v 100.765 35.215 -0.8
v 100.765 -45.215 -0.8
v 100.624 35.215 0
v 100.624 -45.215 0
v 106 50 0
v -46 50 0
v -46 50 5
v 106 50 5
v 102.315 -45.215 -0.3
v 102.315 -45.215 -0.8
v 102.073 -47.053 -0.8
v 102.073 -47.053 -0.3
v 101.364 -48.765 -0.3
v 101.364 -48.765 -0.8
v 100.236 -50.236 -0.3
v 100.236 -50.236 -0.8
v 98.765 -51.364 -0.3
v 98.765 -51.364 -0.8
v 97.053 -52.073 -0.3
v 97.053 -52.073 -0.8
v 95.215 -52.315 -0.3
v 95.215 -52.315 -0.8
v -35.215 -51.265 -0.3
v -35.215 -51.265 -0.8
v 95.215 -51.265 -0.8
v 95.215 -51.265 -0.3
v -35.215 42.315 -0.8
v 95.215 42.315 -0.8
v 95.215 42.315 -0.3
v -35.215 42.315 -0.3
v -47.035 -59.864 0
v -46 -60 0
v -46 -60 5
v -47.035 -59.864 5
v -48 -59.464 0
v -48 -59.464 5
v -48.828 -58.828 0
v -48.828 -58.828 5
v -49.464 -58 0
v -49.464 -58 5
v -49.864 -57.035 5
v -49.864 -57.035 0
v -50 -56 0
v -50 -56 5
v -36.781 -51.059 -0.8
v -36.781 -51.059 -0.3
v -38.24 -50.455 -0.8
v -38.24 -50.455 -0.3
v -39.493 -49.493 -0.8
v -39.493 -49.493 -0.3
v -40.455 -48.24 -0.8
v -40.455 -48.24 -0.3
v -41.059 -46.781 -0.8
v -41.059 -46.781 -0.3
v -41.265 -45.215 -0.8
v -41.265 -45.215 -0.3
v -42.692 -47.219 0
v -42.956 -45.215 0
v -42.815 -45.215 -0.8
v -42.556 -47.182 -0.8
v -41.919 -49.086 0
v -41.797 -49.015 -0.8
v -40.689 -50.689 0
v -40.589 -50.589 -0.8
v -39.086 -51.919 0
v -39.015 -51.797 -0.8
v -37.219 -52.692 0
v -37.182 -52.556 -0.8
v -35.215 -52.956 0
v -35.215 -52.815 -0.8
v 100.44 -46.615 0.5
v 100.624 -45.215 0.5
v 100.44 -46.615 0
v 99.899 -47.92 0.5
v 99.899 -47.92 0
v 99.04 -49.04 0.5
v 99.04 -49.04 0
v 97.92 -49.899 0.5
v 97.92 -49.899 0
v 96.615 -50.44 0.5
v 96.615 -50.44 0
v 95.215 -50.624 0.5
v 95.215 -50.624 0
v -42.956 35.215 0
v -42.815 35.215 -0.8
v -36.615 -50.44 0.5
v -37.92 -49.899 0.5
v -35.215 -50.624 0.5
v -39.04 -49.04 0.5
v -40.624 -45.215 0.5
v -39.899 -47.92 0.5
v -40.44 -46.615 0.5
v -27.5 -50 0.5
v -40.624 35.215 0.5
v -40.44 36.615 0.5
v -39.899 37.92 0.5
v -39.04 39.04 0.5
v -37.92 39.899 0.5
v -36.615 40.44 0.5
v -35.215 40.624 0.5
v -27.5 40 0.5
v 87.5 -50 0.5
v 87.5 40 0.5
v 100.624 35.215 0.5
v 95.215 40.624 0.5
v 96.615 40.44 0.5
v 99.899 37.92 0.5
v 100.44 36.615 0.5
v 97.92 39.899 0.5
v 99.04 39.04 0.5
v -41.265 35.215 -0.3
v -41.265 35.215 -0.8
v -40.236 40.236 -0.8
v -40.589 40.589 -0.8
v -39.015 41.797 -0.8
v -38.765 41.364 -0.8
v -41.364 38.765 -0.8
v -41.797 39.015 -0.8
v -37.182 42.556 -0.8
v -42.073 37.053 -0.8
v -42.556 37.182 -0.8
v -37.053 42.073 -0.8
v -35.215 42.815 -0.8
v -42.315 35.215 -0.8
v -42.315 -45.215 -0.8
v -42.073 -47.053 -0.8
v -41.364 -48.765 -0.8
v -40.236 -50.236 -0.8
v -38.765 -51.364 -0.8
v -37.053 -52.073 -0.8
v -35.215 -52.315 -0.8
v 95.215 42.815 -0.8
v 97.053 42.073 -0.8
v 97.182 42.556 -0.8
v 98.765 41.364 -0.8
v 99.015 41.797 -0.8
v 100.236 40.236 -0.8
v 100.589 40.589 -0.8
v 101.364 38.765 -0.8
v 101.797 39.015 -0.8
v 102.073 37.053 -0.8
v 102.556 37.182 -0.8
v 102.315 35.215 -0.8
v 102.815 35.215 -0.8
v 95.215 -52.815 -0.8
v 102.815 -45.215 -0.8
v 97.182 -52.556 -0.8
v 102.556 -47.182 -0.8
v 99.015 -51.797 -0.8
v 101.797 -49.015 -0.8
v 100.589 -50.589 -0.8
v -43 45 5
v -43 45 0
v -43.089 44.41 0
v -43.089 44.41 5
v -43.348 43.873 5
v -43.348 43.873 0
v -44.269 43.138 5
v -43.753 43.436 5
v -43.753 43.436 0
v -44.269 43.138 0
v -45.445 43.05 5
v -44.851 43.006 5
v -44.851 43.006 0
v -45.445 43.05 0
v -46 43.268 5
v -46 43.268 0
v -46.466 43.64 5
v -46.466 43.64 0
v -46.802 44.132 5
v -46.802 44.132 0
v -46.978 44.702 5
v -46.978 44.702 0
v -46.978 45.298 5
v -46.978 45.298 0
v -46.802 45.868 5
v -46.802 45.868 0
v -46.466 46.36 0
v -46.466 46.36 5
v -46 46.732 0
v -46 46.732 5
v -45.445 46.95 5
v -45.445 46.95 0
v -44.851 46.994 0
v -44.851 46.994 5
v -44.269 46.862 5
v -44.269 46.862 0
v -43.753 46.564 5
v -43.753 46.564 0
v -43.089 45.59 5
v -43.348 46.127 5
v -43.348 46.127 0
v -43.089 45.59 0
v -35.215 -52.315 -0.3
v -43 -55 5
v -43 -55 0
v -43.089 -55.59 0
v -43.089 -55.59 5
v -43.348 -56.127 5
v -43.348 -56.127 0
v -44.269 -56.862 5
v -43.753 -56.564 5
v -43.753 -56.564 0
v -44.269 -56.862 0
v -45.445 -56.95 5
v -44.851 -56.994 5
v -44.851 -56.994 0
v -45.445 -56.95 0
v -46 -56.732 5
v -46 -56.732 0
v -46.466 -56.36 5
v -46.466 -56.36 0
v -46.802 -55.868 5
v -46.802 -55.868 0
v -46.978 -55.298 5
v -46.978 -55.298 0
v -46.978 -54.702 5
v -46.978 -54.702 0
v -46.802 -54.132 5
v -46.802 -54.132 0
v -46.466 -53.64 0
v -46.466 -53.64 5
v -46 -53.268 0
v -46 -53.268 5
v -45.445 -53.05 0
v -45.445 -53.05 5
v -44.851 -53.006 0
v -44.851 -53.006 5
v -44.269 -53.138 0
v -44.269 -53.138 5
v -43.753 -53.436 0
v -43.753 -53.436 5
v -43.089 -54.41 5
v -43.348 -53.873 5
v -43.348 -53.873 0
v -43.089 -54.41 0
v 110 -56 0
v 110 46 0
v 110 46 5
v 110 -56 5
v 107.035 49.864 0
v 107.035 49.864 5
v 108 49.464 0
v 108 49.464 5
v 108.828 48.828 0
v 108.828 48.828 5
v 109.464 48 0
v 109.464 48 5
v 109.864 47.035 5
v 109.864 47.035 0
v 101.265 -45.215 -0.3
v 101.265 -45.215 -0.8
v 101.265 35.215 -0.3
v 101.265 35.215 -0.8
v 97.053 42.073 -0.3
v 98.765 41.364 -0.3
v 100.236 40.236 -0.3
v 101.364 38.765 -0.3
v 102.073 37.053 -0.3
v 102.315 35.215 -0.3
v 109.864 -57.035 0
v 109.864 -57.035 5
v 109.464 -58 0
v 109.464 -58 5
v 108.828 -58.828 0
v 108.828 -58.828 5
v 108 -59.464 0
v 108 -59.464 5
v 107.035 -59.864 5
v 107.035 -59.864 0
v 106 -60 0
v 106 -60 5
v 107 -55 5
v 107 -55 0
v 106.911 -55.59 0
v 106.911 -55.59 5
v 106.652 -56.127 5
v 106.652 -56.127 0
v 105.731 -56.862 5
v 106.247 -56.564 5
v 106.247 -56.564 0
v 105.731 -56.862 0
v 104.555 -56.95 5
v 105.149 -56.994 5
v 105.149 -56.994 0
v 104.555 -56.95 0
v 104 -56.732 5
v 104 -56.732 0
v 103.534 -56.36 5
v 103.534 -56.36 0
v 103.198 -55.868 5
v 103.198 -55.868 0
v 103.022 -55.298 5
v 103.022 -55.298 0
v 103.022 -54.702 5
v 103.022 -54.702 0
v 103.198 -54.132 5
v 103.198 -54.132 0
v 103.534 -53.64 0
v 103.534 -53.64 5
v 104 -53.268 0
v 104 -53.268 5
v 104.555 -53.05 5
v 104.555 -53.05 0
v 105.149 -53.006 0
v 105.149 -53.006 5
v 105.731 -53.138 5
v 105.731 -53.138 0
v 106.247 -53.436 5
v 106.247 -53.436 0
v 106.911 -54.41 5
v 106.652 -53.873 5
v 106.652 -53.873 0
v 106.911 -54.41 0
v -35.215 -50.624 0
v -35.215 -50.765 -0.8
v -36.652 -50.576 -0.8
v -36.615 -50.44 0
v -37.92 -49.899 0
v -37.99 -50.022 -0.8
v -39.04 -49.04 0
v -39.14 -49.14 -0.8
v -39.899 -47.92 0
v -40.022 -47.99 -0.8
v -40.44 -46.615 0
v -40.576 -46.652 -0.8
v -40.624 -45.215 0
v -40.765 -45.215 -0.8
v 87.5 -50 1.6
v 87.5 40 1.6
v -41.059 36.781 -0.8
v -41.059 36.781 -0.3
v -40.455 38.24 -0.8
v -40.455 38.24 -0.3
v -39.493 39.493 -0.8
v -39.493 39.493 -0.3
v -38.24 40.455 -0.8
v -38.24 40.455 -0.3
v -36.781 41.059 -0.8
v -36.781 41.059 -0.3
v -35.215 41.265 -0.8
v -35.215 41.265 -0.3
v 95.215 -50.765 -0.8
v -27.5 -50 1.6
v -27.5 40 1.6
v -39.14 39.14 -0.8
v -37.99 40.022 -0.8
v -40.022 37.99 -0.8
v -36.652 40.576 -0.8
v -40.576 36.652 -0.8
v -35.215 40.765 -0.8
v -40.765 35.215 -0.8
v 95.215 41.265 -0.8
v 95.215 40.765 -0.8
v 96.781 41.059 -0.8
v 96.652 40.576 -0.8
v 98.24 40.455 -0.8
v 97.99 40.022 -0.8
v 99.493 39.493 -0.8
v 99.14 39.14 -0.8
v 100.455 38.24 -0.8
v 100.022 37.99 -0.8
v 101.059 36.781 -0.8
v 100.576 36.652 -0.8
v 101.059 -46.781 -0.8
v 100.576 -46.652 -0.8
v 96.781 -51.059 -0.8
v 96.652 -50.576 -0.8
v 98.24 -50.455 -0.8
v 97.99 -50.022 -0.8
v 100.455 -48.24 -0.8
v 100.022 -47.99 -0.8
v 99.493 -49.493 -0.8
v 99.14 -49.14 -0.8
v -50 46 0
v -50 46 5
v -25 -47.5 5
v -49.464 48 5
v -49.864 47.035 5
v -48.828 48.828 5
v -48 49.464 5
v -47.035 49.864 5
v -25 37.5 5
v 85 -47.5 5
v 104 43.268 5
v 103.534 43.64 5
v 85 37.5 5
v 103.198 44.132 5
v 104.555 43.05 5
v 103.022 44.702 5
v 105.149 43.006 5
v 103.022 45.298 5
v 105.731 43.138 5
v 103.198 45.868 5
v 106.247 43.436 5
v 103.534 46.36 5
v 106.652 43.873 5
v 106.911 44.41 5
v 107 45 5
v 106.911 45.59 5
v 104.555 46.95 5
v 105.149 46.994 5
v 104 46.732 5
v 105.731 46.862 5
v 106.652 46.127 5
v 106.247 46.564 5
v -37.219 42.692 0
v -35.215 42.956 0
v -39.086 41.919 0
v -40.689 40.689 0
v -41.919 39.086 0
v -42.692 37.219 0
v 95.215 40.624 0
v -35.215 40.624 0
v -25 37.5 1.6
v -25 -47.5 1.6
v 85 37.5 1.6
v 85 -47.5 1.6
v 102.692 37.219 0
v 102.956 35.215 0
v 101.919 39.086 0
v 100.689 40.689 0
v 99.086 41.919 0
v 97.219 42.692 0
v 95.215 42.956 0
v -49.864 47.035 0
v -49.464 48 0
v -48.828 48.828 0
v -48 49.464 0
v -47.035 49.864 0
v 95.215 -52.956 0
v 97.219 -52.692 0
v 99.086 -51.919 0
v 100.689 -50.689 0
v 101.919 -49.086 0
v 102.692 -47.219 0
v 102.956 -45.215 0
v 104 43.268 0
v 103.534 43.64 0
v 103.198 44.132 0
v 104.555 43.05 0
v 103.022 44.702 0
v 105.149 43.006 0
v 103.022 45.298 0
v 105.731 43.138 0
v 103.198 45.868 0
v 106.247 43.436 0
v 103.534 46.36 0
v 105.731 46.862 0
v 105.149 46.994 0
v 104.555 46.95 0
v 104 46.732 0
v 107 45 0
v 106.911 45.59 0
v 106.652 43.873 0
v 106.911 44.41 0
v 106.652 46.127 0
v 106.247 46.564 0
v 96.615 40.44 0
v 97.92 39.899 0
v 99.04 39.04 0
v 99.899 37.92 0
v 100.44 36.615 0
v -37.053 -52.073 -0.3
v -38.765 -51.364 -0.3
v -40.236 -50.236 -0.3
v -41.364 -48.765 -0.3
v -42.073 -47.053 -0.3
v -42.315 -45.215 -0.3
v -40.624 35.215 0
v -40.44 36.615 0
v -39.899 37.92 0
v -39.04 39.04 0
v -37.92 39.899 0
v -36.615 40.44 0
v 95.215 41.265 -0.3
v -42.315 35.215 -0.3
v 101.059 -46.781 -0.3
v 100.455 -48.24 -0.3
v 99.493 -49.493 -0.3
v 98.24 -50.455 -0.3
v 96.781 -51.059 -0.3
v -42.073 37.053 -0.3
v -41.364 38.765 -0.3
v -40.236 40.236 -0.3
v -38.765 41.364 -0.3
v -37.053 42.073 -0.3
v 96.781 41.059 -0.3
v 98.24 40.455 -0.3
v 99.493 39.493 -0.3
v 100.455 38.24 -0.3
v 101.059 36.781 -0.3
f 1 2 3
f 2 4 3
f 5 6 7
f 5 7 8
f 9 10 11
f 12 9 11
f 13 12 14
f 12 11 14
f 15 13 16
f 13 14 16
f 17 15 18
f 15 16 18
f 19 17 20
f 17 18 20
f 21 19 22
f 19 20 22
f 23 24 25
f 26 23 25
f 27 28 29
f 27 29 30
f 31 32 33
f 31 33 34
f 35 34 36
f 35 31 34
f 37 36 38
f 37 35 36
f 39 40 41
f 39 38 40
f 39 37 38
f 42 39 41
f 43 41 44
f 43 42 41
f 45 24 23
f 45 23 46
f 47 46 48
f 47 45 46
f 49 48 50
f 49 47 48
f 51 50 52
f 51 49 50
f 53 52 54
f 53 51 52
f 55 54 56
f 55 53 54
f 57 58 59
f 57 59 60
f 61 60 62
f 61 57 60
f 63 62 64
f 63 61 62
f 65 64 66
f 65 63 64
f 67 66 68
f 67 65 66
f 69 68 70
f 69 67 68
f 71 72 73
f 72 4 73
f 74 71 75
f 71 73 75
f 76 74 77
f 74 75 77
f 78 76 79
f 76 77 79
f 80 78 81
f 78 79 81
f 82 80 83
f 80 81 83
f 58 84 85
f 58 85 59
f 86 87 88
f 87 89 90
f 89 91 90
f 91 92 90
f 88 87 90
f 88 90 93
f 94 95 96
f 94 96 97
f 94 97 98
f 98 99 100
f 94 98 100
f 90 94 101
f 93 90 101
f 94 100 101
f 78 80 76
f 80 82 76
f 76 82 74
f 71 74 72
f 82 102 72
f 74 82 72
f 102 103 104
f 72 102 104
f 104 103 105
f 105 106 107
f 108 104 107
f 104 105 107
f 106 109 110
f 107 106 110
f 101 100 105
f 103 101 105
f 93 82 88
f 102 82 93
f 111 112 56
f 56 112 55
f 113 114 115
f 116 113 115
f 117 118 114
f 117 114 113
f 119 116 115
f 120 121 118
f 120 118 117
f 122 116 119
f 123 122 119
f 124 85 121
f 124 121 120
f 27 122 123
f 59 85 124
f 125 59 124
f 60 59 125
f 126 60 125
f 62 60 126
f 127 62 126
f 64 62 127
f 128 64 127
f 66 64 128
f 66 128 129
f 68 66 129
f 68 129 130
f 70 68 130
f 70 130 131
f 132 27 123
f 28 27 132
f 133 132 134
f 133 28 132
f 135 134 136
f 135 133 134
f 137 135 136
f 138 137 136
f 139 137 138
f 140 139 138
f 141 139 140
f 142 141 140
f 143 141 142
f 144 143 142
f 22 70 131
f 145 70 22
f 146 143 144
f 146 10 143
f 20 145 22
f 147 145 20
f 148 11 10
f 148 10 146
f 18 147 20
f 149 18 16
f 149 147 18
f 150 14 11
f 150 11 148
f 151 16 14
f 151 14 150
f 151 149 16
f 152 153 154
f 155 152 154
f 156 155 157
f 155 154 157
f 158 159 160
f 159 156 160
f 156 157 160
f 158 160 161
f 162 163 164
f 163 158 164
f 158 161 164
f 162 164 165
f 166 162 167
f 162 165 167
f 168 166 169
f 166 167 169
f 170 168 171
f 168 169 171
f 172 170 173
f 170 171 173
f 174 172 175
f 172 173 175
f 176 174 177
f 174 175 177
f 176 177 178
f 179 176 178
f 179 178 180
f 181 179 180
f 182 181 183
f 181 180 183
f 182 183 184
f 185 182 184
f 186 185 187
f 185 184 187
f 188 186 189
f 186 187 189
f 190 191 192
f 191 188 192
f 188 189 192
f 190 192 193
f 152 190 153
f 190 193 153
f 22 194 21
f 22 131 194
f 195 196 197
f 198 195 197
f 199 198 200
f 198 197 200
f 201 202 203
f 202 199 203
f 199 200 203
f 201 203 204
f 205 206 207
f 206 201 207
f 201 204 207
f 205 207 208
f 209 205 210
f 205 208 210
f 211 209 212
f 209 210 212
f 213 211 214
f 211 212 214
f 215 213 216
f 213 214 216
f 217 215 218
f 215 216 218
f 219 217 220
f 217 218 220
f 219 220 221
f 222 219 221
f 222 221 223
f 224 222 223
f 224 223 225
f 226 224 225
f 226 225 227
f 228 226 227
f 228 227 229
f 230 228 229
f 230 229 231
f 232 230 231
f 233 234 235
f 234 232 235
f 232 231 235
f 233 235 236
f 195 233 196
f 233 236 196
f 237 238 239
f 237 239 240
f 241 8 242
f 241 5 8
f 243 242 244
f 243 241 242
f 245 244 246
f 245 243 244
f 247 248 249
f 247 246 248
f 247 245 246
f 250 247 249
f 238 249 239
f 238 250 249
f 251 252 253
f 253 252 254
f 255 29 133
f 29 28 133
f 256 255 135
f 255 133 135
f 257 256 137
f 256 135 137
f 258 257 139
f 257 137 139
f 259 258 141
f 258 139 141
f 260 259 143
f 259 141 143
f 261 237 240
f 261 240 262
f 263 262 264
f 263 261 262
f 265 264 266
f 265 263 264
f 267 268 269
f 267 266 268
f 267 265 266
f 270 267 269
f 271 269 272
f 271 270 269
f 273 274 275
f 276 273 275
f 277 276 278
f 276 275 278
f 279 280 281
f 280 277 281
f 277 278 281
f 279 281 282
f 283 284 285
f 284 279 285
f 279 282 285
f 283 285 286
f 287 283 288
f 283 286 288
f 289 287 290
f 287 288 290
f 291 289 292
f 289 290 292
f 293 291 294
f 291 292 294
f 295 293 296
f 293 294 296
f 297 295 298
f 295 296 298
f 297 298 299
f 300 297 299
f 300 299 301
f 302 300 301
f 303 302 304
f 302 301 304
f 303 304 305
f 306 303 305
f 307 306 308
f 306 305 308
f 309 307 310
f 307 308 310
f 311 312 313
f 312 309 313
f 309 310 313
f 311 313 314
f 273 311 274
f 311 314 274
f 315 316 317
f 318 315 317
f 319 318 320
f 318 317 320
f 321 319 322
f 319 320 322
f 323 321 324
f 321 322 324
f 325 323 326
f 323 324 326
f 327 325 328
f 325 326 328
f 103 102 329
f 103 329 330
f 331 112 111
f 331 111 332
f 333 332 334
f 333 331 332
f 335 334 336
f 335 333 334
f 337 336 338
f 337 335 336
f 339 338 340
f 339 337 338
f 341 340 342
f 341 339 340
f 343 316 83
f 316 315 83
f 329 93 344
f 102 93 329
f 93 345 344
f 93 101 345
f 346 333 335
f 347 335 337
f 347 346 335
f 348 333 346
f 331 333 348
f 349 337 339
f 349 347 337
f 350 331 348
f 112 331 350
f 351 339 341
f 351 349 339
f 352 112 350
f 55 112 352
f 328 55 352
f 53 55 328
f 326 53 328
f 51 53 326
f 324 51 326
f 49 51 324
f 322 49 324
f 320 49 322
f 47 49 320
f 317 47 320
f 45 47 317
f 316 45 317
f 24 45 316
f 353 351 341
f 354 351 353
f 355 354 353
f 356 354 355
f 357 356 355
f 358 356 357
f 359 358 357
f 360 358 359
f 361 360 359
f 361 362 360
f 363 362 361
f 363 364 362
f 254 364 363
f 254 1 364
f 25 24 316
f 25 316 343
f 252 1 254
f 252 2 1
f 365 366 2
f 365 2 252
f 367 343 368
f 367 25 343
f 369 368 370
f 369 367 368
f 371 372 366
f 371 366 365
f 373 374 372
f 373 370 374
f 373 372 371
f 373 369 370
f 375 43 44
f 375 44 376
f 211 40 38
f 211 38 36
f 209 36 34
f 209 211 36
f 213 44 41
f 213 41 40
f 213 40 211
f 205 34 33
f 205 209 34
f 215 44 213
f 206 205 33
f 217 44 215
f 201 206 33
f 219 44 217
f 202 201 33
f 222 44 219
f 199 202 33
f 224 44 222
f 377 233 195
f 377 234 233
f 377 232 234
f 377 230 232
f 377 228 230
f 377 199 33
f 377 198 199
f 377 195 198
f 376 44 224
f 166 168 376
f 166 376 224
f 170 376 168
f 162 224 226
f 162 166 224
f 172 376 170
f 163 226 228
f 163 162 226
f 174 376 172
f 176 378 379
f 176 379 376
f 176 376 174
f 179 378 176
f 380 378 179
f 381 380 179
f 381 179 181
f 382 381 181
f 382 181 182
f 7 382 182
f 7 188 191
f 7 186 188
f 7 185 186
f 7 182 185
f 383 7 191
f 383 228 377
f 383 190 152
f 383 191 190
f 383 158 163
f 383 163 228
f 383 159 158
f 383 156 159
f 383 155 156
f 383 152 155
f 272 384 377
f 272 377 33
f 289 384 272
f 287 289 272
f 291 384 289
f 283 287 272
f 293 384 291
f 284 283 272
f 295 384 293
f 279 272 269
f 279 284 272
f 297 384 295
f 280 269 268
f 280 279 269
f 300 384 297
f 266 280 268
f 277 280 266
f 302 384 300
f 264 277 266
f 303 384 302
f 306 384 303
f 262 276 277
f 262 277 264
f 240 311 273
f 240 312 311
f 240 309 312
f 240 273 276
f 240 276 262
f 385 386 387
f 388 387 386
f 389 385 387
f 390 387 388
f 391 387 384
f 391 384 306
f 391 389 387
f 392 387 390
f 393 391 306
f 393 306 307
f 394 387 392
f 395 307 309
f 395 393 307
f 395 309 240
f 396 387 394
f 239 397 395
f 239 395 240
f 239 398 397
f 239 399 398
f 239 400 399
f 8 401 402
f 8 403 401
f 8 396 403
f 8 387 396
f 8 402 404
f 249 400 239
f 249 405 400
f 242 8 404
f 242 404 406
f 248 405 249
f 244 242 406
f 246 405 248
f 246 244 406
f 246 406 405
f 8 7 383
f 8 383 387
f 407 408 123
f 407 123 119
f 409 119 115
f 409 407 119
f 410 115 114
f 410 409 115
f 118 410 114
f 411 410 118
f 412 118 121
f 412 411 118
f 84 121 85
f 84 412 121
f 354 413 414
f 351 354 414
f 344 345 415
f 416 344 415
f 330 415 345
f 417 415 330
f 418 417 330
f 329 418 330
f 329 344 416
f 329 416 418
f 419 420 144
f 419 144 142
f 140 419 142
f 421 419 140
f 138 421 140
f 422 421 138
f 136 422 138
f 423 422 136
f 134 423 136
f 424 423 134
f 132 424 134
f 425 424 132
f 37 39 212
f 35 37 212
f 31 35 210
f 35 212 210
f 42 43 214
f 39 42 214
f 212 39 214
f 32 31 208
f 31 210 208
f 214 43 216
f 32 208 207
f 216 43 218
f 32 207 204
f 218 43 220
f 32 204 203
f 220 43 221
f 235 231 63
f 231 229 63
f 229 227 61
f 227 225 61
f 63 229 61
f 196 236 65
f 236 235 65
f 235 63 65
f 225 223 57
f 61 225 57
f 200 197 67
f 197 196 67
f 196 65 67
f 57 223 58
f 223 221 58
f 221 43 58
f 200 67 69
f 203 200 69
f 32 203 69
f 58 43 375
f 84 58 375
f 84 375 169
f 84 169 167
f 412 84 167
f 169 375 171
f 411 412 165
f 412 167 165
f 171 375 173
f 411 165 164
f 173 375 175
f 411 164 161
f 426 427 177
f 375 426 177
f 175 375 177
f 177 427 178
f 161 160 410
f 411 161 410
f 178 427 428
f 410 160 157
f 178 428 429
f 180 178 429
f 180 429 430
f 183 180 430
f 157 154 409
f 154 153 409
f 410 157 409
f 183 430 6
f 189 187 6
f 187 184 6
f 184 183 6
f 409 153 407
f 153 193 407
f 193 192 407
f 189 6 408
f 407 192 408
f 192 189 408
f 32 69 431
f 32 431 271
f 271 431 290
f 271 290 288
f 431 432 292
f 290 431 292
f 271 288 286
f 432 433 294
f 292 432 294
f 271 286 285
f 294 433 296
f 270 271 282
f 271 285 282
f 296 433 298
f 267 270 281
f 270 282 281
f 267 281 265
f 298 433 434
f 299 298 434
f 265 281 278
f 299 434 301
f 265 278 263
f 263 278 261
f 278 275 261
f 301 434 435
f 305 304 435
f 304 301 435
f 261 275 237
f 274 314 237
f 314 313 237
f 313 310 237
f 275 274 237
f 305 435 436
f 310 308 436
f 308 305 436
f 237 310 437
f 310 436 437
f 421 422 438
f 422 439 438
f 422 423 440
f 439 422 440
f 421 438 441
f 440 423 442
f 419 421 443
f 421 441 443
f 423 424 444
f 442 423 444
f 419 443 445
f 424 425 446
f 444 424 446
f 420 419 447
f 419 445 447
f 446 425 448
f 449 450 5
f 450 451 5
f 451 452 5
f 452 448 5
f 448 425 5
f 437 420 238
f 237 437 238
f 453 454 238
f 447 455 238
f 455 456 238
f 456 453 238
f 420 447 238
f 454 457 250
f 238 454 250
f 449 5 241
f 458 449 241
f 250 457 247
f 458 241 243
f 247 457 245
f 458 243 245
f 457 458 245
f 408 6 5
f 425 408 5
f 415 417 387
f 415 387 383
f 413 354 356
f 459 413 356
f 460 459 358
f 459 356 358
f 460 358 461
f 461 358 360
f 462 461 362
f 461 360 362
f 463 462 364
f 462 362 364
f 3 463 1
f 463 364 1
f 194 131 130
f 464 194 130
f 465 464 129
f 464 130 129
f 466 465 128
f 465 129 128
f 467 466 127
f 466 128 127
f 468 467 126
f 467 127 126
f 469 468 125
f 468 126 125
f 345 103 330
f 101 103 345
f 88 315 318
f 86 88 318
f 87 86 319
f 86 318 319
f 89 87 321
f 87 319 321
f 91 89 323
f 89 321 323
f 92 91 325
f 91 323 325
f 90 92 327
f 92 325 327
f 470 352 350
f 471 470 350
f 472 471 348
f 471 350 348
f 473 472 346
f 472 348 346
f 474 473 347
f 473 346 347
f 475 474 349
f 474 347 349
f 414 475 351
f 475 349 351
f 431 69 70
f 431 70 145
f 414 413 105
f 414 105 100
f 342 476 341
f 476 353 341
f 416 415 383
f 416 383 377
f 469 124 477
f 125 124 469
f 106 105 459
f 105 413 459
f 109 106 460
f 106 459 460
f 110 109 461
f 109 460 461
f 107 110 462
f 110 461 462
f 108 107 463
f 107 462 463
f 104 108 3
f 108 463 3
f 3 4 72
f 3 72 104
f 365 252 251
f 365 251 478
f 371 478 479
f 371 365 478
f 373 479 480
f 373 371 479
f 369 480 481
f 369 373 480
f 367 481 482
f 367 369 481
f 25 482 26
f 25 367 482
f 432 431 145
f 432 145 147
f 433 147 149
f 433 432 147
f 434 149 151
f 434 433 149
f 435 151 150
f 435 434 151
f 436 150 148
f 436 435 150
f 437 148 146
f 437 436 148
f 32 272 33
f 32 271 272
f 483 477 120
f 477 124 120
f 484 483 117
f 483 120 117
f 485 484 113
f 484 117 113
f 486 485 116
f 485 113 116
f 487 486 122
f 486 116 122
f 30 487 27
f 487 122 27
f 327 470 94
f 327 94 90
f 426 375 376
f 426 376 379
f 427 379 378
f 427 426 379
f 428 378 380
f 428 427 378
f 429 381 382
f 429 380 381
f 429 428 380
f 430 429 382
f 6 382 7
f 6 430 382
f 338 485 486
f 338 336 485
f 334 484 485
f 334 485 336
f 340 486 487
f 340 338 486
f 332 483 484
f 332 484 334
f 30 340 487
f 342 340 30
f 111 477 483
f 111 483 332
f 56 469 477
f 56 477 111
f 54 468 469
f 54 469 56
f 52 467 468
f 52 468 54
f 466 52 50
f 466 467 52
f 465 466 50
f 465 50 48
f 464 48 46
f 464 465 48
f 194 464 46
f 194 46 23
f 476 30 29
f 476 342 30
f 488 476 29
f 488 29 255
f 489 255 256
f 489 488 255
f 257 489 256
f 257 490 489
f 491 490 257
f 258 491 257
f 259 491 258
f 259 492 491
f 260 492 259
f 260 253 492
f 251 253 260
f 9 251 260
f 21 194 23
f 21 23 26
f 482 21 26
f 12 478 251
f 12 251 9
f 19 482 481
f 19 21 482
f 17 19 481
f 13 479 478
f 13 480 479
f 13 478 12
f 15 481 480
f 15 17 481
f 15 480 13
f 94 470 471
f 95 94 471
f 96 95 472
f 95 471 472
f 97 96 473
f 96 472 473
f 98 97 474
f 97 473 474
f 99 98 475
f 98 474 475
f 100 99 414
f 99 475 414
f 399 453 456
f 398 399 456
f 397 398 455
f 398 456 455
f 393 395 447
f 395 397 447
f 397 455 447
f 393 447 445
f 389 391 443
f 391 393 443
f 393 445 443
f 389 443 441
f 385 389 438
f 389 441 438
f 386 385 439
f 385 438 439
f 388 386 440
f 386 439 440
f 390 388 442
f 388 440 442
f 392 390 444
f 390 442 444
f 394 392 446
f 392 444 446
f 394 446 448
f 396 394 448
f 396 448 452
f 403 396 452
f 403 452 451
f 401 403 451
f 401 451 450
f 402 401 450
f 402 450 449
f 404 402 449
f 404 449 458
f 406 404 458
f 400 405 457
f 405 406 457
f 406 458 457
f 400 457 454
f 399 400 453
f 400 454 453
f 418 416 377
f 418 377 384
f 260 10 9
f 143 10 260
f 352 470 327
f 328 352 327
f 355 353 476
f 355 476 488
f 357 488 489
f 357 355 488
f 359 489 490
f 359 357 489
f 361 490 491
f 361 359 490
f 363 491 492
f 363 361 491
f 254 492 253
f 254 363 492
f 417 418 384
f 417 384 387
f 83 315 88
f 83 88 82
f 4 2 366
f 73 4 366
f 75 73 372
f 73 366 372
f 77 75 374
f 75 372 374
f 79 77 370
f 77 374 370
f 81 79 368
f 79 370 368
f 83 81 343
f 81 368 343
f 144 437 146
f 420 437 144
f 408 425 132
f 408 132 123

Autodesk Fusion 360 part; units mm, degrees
sketch "Sketch2" plane through (0, 0, 0) normal (0, 0, 1) x (1, 0, 0)
  line L0 (-46, 50) -> (106, 50)
  line L1 (110, 46) -> (110, -56)
  line L2 (106, -60) -> (-46, -60)
  line L3 (-50, -56) -> (-50, 46)
  circle A0 centre (-45, 45) radius 2
  line L4 (30, -60) -> (30, 50) construction
  line L5 (-50, -5) -> (110, -5) construction
  arc A1 (-46, 50) -> (-50, 46) centre (-46, 46) ccw
  circle A2 centre (105, 45) radius 2
  arc A3 (110, 46) -> (106, 50) centre (106, 46) ccw
  circle A4 centre (105, -55) radius 2
  arc A5 (106, -60) -> (110, -56) centre (106, -56) ccw
  circle A6 centre (-45, -55) radius 2
  arc A7 (-50, -56) -> (-46, -60) centre (-46, -56) ccw
  point P0 (-50, 50)
  point P1 (110, 50)
  dimension "d3" = 4
  dimension "d4" = 5
  dimension "d5" = 5
  dimension "d6" = 4
  dimension "d63" = 160
  dimension "d64" = 110
extrude "Extrude1" add sketch "Sketch2" along normal blind 5
sketch "Sketch3" plane through (0, 0, 0) normal (0, 0, -1) x (1, 0, 0)
  circle A0 centre (105, 55) radius 2
  circle A1 centre (-45, 55) radius 2
  circle A2 centre (-45, -45) radius 2
  circle A3 centre (105, -45) radius 2
  arc A4 (-50, -46) -> (-46, -50) centre (-46, -46) ccw
  line L0 (-46, -50) -> (106, -50)
  arc A5 (106, -50) -> (110, -46) centre (106, -46) ccw
  line L1 (110, -46) -> (110, 56)
  arc A6 (110, 56) -> (106, 60) centre (106, 56) ccw
  line L2 (106, 60) -> (-46, 60)
  arc A7 (-46, 60) -> (-50, 56) centre (-46, 56) ccw
  line L3 (-50, 56) -> (-50, -46)
  line L4 (30, 60) -> (30, -50) construction
  line L5 (110, 5) -> (-50, 5) construction
  line L6 (101.7902, -41.7902) -> (-41.7901, -41.7902) construction
  line L7 (-41.7901, -41.7902) -> (-41.7901, 51.7901) construction
  line L8 (-41.7901, 51.7901) -> (101.7902, 51.7901) construction
  line L9 (101.7902, 51.7901) -> (101.7902, -41.7902) construction
  line L10 (101.7902, -41.7902) -> (-41.7901, 51.7901) construction
  line L11 (-41.7901, -41.7902) -> (101.7902, 51.7901) construction
  line L12 (95.2151, -42.8152) -> (-35.2152, -42.8152)
  line L13 (-42.8152, -35.2152) -> (-42.8152, 45.2151)
  line L14 (-35.2151, 52.8151) -> (95.2151, 52.8151)
  line L15 (102.8152, 45.2151) -> (102.8152, -35.2152)
  line L16 (88.9278, -33.6958) -> (-42.8152, 52.8151) construction
  line L17 (-37.4412, -35.28) -> (85.6746, 38.2522) construction
  line L18 (-40.7652, -35.2152) -> (-40.7652, 45.2152)
  line L19 (-35.2152, 50.7652) -> (95.2152, 50.7652)
  line L20 (100.7652, 45.2152) -> (100.7652, -35.2152)
  line L21 (98.2241, -39.1218) -> (-40.7652, 50.7652) construction
  line L22 (-34.7613, -32.5014) -> (82.9436, 35.6581) construction
  arc A8 (-35.2152, 50.7652) -> (-40.7652, 45.2152) centre (-35.2152, 45.2152) ccw
  arc A9 (-35.2151, 52.8151) -> (-42.8152, 45.2151) centre (-35.2152, 45.2151) ccw
  arc A10 (100.7652, 45.2152) -> (95.2152, 50.7652) centre (95.2152, 45.2152) ccw
  arc A11 (102.8152, 45.2151) -> (95.2151, 52.8151) centre (95.2152, 45.2151) ccw
  arc A12 (-40.7652, -35.2152) -> (-35.2152, -40.7652) centre (-35.2152, -35.2152) ccw
  arc A13 (-42.8152, -35.2152) -> (-35.2152, -42.8152) centre (-35.2152, -35.2152) ccw
  arc A14 (95.2152, -40.7652) -> (100.7652, -35.2152) centre (95.2152, -35.2152) ccw
  arc A15 (95.2151, -42.8152) -> (102.8151, -35.2152) centre (95.2151, -35.2152) ccw
  line L23 (95.2152, -40.7652) -> (-35.2152, -40.7652)
  point P0 (30, 5)
  point P1 (30, 5)
  point P2 (30, 5)
  point P3 (30, 5)
  point P4 (30, 5)
  dimension "d25" = 143.5803
  dimension "d27" = 93.5803
  dimension "d28" = 1.025
  dimension "d29" = 1.025
  dimension "d30" = 1.025
  dimension "d31" = 1.025
  dimension "d44" = 5.55
  dimension "d45" = 7.6
extrude "Extrude4" add sketch "Sketch3" along normal blind 0.8 contours L12 L13 L14 L15 A9 A11 A13 A15
draft "Draft3" angle 10 neutral plane through (0, 0, -0.8) pull (0, 0, -1) 16 faces at (8.2616, -50.7652, -0.5333) (98.4345, -49.736, -0.5333) (100.7652, -18.4051, -0.5333) (96.5236, 40.6087, -0.5333) (8.2616, 40.7652, -0.5333) (-36.2655, 40.6649, -0.5333) (-40.7652, 8.4051, -0.2667) (-39.736, -48.4345, -0.5333) (-42.8152, 8.4051, -0.5333) (-41.1892, 39.9132, -0.5333) (8.2616, 42.8152, -0.2667) (101.7969, 39.0152, -0.5333) (102.8152, -18.405, -0.5333) (97.0069, -52.6009, -0.5333) (8.2616, -52.8151, -0.2667) (-42.3972, -47.7009, -0.5333)
sketch "Sketch5" plane through (0, 0, -0.8) normal (0, 0, -1) x (1, 0, 0)
  line L0 (-35.2152, 50.7652) -> (95.2152, 50.7652)
  line L1 (100.7652, 45.2152) -> (100.7652, -35.2152)
  line L2 (95.2152, -40.7652) -> (-35.2152, -40.7652)
  line L3 (-40.7652, -35.2152) -> (-40.7652, 45.2152)
  line L4 (95.2151, 52.8151) -> (-35.2151, 52.8151)
  line L5 (-42.8152, 45.2151) -> (-42.8152, -35.2152)
  line L6 (-35.2152, -42.8152) -> (95.2151, -42.8152)
  line L7 (102.8151, -35.2152) -> (102.8152, 45.2151)
  line L8 (30, 52.8151) -> (30, -42.8152) construction
  line L9 (102.8151, 5) -> (-42.8152, 5) construction
  line L10 (101.7901, -41.7902) -> (-41.7902, -41.7902) construction
  line L11 (-41.7902, -41.7902) -> (-41.7902, 51.7901) construction
  line L12 (-41.7902, 51.7901) -> (101.7901, 51.7901) construction
  line L13 (101.7901, 51.7901) -> (101.7901, -41.7902) construction
  line L14 (101.7901, -41.7902) -> (-41.7902, 51.7901) construction
  line L15 (-41.7902, -41.7902) -> (101.7901, 51.7901) construction
  line L16 (95.2151, -42.3152) -> (-35.2151, -42.3152)
  line L17 (-42.3151, -35.2152) -> (-42.3151, 45.2151)
  line L18 (-35.2151, 52.3151) -> (95.2151, 52.3151)
  line L19 (102.3151, 45.2151) -> (102.3151, -35.2152)
  line L20 (89.0725, -33.6506) -> (-42.3151, 52.3151) construction
  line L21 (-42.3151, -42.3152) -> (89.0725, 43.6506) construction
  line L22 (95.2151, -41.2652) -> (-35.2151, -41.2652)
  line L23 (-41.2651, -35.2152) -> (-41.2651, 45.2151)
  line L24 (101.2651, 45.2151) -> (101.2651, -35.2152)
  line L25 (88.0406, -32.6798) -> (-41.2651, 51.2651) construction
  line L26 (-41.2651, -41.2652) -> (88.0406, 42.6798) construction
  arc A0 (100.7652, 45.2152) -> (95.2152, 50.7652) centre (95.2152, 45.2152) ccw
  arc A1 (95.2152, -40.7652) -> (100.7652, -35.2152) centre (95.2152, -35.2152) ccw
  arc A2 (-40.7652, -35.2152) -> (-35.2152, -40.7652) centre (-35.2152, -35.2152) ccw
  arc A3 (-35.2152, 50.7652) -> (-40.7652, 45.2152) centre (-35.2152, 45.2152) ccw
  arc A4 (-42.8152, -35.2152) -> (-35.2152, -42.8152) centre (-35.2152, -35.2152) ccw
  arc A5 (95.2151, -42.8152) -> (102.8151, -35.2152) centre (95.2152, -35.2152) ccw
  arc A6 (102.8152, 45.2151) -> (95.2151, 52.8152) centre (95.2152, 45.2152) ccw
  arc A7 (-35.2151, 52.8151) -> (-42.8151, 45.2151) centre (-35.2152, 45.2152) ccw
  arc A8 (-35.2151, 51.2651) -> (-41.2651, 45.2151) centre (-35.2151, 45.2151) ccw
  arc A9 (-35.2151, 52.3151) -> (-42.3151, 45.2151) centre (-35.2151, 45.2151) ccw
  arc A10 (101.2651, 45.2151) -> (95.2151, 51.2651) centre (95.2151, 45.2151) ccw
  arc A11 (102.3151, 45.2151) -> (95.2151, 52.3151) centre (95.2151, 45.2151) ccw
  line L27 (-35.2151, 51.2651) -> (95.2151, 51.2651)
  arc A12 (95.2151, -41.2652) -> (101.2651, -35.2152) centre (95.2151, -35.2152) ccw
  arc A13 (95.2151, -42.3152) -> (102.3151, -35.2152) centre (95.2151, -35.2152) ccw
  arc A14 (-41.2651, -35.2152) -> (-35.2151, -41.2652) centre (-35.2151, -35.2152) ccw
  arc A15 (-42.3151, -35.2152) -> (-35.2151, -42.3152) centre (-35.2151, -35.2152) ccw
  point P0 (30, 5)
  point P1 (30, 5)
  point P2 (30, 5)
  dimension "d36" = 143.5803
  dimension "d37" = 93.5803
  dimension "d38" = 0.525
  dimension "d39" = 0.525
  dimension "d40" = 0.525
  dimension "d41" = 0.525
  dimension "d50" = 6.05
  dimension "d51" = 7.1
extrude "Extrude6" cut sketch "Sketch5" against normal blind 0.5 contours L16 L17 L18 L19 A9 A11 A13 A15
extrude "Extrude7" cut 1 faces at (51.7384, -20.208, 0) along direction (0, 0, 1) blind 0.5
sketch "Sketch6" plane through (0, 0, 0.5) normal (0, 0, -1) x (1, 0, 0)
  line L0 (95.2152, 50.6241) -> (-35.2152, 50.6241)
  arc A0 (-35.2152, 50.6241) -> (-40.6241, 45.2152) centre (-35.2152, 45.2152) ccw
  line L1 (-40.6241, 45.2152) -> (-40.6241, -35.2152)
  arc A1 (-40.6241, -35.2152) -> (-35.2152, -40.6241) centre (-35.2152, -35.2152) ccw
  line L2 (-35.2152, -40.6241) -> (95.2152, -40.6241)
  arc A2 (95.2152, -40.6241) -> (100.6241, -35.2152) centre (95.2152, -35.2152) ccw
  line L3 (100.6241, -35.2152) -> (100.6241, 45.2152)
  arc A3 (100.6241, 45.2152) -> (95.2152, 50.6241) centre (95.2152, 45.2152) ccw
  line L4 (30, 50.6241) -> (30, -40.6241) construction
  line L5 (-40.6241, 5) -> (100.6241, 5) construction
  line L6 (87.5, -40) -> (-27.5, -40)
  line L7 (-27.5, -40) -> (-27.5, 50)
  line L8 (-27.5, 50) -> (87.5, 50)
  line L9 (87.5, 50) -> (87.5, -40)
  line L10 (87.5, -40) -> (-27.5, 50) construction
  line L11 (-27.5, -40) -> (87.5, 50) construction
  point P0 (30, 5)
  dimension "d58" = 115
  dimension "d59" = 90
extrude "Extrude8" cut sketch "Sketch6" against normal blind 1.1 contours L6 L7 L8 L9
sketch "Sketch7" plane through (0, 0, 1.6) normal (0, 0, -1) x (1, 0, 0)
  line L0 (87.5, 50) -> (-27.5, 50)
  line L1 (-27.5, 50) -> (-27.5, -40)
  line L2 (-27.5, -40) -> (87.5, -40)
  line L3 (87.5, -40) -> (87.5, 50)
  line L4 (30, 50) -> (30, -40) construction
  line L5 (87.5, 5) -> (-27.5, 5) construction
  line L6 (85, -37.5) -> (-25, -37.5)
  line L7 (-25, -37.5) -> (-25, 47.5)
  line L8 (-25, 47.5) -> (85, 47.5)
  line L9 (85, 47.5) -> (85, -37.5)
  line L10 (85, -37.5) -> (-25, 47.5) construction
  line L11 (-25, -37.5) -> (85, 47.5) construction
  point P0 (30, 5)
  dimension "d62" = 110
  dimension "d65" = 85
extrude "Extrude9" cut sketch "Sketch7" against normal blind 8.4 contours L6 L7 L8 L9
equation "ORingDiameter = 1 mm" comment "Diamter of the O ring"
equation "ORingInnerDiameter = 150 mm" comment "Inner diamter of the o ring bore"
equation "d25 = ( ORingPerimeter - 100 mm ) / 4 + 50 mm"
equation "ORingPerimeter = 2 * 3.1412 * ( ( ORingInnerDiameter / 2 ) + ORingDiameter / 2 )"
equation "d27 = ( ORingPerimeter - 100 mm ) / 4"
equation "d28 = ( ( ORingDiameter * 1.05 ) / 2 ) + 0.5 mm"
equation "d29 = ( ( ORingDiameter * 1.05 ) / 2 ) + 0.5 mm"
equation "d30 = ( ( ORingDiameter * 1.05 ) / 2 ) + 0.5 mm"
equation "d31 = ( ( ORingDiameter * 1.05 ) / 2 ) + 0.5 mm"
equation "d32 = ORingDiameter * 0.8"
equation "d36 = ( ORingPerimeter - 100 mm ) / 4 + 50 mm"
equation "d37 = ( ORingPerimeter - 100 mm ) / 4"
equation "d38 = ( ORingDiameter * 1.05 ) / 2"
equation "d39 = ( ORingDiameter * 1.05 ) / 2"
equation "d40 = ( ORingDiameter * 1.05 ) / 2"
equation "d41 = ( ORingDiameter * 1.05 ) / 2"
equation "d44 = ( ORingDiameter ) * 6 + ORingDiameter * 0.05 - 0.5 mm"
equation "d45 = ( ORingDiameter ) * 6 + ( ORingDiameter * 1.1 ) + 0.5 mm"
equation "d50 = ( ORingDiameter ) * 6 + ORingDiameter * 0.05 - 0.0 mm"
equation "d51 = ( ORingDiameter ) * 6 + ORingDiameter * 1.1 + 0 mm"
equation "PanelWidth = 90 mm"
equation "PanelLength = 115 mm"
equation "d58 = PanelLength"
equation "d59 = PanelWidth"
equation "d62 = PanelLength - 5 mm"
equation "d65 = PanelWidth - 5 mm"
